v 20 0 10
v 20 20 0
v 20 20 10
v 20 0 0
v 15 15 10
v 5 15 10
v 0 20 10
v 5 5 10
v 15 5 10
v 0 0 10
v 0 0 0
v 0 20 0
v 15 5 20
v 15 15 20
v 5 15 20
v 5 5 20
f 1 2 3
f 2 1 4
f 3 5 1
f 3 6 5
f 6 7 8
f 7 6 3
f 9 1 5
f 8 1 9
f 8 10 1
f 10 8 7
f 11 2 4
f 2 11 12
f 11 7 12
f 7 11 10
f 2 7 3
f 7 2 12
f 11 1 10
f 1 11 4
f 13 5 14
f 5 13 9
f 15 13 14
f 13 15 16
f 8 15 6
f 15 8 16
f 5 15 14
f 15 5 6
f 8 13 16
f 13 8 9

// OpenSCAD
//Exemplo 3 - Uso da transformação translate()

union(){
    cube([20,20,10]);
    translate([5,5,0]) cube([10,10,20]);
}
